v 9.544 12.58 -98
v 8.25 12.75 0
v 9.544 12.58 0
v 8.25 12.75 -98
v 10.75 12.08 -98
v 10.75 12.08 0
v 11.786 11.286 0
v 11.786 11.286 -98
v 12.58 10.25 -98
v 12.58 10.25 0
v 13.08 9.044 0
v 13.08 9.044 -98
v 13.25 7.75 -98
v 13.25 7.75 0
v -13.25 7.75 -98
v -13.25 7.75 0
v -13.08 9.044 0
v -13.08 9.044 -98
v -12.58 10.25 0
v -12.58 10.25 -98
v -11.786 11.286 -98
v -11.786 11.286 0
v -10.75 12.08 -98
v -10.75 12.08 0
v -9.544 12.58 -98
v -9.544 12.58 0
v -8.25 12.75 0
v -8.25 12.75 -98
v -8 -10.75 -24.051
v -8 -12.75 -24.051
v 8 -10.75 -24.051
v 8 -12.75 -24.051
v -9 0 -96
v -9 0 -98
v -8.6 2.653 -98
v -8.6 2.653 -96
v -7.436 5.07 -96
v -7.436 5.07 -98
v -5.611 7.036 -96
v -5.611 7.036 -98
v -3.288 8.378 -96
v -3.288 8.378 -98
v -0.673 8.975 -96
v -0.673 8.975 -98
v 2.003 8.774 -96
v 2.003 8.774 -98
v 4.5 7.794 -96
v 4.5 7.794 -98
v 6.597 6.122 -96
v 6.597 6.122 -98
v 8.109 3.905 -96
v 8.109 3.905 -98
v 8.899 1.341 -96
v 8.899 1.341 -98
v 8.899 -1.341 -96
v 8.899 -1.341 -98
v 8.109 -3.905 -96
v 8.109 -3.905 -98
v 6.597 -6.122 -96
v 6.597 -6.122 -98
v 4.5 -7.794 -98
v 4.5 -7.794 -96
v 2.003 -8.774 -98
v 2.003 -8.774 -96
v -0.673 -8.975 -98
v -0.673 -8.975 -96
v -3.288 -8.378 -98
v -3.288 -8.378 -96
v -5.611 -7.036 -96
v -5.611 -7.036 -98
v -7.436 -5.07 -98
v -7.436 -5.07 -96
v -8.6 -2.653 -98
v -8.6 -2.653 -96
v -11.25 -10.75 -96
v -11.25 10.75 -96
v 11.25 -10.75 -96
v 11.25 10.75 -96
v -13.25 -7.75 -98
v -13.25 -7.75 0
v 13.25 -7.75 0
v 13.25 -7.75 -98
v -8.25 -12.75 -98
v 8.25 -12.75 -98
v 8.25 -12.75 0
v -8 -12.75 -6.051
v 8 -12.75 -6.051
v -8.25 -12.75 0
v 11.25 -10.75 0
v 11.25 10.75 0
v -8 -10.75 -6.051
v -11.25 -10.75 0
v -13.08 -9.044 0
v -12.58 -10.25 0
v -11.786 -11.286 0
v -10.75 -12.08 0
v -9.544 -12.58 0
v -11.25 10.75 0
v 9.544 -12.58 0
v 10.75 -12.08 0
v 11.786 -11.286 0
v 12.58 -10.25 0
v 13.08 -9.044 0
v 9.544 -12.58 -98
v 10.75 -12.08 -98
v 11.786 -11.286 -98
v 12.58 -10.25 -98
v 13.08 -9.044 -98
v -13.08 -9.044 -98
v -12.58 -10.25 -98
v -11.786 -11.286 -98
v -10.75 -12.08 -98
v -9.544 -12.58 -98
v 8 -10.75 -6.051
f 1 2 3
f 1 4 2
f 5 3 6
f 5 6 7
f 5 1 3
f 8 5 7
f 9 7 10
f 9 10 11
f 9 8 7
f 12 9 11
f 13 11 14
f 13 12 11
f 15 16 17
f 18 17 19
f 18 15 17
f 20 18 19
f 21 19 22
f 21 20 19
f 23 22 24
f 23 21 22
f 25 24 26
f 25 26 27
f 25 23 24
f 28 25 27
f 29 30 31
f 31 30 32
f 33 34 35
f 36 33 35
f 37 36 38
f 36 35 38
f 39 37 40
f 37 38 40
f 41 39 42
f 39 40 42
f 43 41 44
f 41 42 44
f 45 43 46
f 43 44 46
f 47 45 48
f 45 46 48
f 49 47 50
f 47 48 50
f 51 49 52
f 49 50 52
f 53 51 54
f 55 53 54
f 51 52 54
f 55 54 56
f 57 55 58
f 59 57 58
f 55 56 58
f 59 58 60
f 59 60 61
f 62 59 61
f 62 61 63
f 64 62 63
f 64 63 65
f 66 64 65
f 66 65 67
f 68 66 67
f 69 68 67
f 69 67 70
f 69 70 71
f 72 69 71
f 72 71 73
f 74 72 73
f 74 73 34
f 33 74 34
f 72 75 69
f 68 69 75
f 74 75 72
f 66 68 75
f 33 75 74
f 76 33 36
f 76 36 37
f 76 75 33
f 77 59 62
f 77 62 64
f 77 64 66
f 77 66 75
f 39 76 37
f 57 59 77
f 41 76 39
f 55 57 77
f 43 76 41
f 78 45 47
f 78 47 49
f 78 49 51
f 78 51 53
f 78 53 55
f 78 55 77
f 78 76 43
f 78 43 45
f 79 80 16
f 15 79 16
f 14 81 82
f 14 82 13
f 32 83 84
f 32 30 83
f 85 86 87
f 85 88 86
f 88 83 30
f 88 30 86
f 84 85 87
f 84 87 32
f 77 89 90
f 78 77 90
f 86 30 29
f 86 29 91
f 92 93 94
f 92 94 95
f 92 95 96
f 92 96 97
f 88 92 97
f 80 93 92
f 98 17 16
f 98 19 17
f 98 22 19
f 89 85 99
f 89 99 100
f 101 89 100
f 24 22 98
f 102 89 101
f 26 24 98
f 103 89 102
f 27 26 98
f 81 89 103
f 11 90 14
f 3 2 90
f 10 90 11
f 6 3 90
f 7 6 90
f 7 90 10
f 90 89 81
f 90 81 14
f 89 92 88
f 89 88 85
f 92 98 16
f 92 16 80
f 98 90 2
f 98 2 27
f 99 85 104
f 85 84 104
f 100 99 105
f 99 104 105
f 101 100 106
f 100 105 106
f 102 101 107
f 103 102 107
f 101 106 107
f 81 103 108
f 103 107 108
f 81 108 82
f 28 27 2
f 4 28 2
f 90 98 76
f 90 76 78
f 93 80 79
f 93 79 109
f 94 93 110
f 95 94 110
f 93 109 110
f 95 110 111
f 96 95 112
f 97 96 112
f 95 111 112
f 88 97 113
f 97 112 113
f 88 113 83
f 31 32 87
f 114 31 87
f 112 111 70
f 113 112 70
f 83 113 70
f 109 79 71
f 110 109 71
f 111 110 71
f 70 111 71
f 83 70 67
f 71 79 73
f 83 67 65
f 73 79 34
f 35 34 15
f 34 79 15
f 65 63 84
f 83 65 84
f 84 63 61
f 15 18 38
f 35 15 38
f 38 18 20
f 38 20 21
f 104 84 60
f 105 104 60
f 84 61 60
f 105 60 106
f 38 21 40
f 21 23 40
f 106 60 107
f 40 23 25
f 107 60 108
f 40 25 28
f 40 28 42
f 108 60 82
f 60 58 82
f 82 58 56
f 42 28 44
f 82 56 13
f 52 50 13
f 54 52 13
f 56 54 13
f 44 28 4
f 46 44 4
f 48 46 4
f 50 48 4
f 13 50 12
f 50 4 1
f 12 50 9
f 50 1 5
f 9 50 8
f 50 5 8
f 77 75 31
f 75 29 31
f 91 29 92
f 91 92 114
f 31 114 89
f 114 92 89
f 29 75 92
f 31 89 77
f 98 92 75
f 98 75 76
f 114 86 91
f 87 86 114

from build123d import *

# Parameters (mm, degrees)
F0_W     = 26.5
F0_H     = 25.5
F1_DEPTH = 98
F2_T     = -2
F4_D     = 18
F5_W     = 16
F5_H     = 18
F6_DEPTH = 2
F7_R     = 5


with BuildPart() as f1:
    # F0 (on Top) → F1 (new body)
    with BuildSketch(Plane.XY):
        Rectangle(F0_W, F0_H)
    extrude(amount=-F1_DEPTH)

    # F2
    f2_openings = [f1.faces().sort_by_distance(p)[0] for p in [
        (0, 0, 0),
    ]]
    offset(amount=F2_T, openings=f2_openings)

    # F4 (through all)
    with Locations(Plane.XY):
        with Locations((0, 0)):
            Hole(F4_D / 2)

    # F5 (on face) → F6 (cut)
    with BuildSketch(Plane.XZ.offset(12.75)):
        with Locations((0, -15.051324)):
            Rectangle(F5_W, F5_H)
    extrude(amount=-F6_DEPTH, mode=Mode.SUBTRACT)

    # F7
    f7_edges = [f1.edges().sort_by_distance(p)[0] for p in [
        (13.25, -12.75, -49),
        (13.25, 12.75, -49),
        (-13.25, -12.75, -49),
        (-13.25, 12.75, -49),
    ]]
    fillet(f7_edges, radius=F7_R)


solid = f1.part
